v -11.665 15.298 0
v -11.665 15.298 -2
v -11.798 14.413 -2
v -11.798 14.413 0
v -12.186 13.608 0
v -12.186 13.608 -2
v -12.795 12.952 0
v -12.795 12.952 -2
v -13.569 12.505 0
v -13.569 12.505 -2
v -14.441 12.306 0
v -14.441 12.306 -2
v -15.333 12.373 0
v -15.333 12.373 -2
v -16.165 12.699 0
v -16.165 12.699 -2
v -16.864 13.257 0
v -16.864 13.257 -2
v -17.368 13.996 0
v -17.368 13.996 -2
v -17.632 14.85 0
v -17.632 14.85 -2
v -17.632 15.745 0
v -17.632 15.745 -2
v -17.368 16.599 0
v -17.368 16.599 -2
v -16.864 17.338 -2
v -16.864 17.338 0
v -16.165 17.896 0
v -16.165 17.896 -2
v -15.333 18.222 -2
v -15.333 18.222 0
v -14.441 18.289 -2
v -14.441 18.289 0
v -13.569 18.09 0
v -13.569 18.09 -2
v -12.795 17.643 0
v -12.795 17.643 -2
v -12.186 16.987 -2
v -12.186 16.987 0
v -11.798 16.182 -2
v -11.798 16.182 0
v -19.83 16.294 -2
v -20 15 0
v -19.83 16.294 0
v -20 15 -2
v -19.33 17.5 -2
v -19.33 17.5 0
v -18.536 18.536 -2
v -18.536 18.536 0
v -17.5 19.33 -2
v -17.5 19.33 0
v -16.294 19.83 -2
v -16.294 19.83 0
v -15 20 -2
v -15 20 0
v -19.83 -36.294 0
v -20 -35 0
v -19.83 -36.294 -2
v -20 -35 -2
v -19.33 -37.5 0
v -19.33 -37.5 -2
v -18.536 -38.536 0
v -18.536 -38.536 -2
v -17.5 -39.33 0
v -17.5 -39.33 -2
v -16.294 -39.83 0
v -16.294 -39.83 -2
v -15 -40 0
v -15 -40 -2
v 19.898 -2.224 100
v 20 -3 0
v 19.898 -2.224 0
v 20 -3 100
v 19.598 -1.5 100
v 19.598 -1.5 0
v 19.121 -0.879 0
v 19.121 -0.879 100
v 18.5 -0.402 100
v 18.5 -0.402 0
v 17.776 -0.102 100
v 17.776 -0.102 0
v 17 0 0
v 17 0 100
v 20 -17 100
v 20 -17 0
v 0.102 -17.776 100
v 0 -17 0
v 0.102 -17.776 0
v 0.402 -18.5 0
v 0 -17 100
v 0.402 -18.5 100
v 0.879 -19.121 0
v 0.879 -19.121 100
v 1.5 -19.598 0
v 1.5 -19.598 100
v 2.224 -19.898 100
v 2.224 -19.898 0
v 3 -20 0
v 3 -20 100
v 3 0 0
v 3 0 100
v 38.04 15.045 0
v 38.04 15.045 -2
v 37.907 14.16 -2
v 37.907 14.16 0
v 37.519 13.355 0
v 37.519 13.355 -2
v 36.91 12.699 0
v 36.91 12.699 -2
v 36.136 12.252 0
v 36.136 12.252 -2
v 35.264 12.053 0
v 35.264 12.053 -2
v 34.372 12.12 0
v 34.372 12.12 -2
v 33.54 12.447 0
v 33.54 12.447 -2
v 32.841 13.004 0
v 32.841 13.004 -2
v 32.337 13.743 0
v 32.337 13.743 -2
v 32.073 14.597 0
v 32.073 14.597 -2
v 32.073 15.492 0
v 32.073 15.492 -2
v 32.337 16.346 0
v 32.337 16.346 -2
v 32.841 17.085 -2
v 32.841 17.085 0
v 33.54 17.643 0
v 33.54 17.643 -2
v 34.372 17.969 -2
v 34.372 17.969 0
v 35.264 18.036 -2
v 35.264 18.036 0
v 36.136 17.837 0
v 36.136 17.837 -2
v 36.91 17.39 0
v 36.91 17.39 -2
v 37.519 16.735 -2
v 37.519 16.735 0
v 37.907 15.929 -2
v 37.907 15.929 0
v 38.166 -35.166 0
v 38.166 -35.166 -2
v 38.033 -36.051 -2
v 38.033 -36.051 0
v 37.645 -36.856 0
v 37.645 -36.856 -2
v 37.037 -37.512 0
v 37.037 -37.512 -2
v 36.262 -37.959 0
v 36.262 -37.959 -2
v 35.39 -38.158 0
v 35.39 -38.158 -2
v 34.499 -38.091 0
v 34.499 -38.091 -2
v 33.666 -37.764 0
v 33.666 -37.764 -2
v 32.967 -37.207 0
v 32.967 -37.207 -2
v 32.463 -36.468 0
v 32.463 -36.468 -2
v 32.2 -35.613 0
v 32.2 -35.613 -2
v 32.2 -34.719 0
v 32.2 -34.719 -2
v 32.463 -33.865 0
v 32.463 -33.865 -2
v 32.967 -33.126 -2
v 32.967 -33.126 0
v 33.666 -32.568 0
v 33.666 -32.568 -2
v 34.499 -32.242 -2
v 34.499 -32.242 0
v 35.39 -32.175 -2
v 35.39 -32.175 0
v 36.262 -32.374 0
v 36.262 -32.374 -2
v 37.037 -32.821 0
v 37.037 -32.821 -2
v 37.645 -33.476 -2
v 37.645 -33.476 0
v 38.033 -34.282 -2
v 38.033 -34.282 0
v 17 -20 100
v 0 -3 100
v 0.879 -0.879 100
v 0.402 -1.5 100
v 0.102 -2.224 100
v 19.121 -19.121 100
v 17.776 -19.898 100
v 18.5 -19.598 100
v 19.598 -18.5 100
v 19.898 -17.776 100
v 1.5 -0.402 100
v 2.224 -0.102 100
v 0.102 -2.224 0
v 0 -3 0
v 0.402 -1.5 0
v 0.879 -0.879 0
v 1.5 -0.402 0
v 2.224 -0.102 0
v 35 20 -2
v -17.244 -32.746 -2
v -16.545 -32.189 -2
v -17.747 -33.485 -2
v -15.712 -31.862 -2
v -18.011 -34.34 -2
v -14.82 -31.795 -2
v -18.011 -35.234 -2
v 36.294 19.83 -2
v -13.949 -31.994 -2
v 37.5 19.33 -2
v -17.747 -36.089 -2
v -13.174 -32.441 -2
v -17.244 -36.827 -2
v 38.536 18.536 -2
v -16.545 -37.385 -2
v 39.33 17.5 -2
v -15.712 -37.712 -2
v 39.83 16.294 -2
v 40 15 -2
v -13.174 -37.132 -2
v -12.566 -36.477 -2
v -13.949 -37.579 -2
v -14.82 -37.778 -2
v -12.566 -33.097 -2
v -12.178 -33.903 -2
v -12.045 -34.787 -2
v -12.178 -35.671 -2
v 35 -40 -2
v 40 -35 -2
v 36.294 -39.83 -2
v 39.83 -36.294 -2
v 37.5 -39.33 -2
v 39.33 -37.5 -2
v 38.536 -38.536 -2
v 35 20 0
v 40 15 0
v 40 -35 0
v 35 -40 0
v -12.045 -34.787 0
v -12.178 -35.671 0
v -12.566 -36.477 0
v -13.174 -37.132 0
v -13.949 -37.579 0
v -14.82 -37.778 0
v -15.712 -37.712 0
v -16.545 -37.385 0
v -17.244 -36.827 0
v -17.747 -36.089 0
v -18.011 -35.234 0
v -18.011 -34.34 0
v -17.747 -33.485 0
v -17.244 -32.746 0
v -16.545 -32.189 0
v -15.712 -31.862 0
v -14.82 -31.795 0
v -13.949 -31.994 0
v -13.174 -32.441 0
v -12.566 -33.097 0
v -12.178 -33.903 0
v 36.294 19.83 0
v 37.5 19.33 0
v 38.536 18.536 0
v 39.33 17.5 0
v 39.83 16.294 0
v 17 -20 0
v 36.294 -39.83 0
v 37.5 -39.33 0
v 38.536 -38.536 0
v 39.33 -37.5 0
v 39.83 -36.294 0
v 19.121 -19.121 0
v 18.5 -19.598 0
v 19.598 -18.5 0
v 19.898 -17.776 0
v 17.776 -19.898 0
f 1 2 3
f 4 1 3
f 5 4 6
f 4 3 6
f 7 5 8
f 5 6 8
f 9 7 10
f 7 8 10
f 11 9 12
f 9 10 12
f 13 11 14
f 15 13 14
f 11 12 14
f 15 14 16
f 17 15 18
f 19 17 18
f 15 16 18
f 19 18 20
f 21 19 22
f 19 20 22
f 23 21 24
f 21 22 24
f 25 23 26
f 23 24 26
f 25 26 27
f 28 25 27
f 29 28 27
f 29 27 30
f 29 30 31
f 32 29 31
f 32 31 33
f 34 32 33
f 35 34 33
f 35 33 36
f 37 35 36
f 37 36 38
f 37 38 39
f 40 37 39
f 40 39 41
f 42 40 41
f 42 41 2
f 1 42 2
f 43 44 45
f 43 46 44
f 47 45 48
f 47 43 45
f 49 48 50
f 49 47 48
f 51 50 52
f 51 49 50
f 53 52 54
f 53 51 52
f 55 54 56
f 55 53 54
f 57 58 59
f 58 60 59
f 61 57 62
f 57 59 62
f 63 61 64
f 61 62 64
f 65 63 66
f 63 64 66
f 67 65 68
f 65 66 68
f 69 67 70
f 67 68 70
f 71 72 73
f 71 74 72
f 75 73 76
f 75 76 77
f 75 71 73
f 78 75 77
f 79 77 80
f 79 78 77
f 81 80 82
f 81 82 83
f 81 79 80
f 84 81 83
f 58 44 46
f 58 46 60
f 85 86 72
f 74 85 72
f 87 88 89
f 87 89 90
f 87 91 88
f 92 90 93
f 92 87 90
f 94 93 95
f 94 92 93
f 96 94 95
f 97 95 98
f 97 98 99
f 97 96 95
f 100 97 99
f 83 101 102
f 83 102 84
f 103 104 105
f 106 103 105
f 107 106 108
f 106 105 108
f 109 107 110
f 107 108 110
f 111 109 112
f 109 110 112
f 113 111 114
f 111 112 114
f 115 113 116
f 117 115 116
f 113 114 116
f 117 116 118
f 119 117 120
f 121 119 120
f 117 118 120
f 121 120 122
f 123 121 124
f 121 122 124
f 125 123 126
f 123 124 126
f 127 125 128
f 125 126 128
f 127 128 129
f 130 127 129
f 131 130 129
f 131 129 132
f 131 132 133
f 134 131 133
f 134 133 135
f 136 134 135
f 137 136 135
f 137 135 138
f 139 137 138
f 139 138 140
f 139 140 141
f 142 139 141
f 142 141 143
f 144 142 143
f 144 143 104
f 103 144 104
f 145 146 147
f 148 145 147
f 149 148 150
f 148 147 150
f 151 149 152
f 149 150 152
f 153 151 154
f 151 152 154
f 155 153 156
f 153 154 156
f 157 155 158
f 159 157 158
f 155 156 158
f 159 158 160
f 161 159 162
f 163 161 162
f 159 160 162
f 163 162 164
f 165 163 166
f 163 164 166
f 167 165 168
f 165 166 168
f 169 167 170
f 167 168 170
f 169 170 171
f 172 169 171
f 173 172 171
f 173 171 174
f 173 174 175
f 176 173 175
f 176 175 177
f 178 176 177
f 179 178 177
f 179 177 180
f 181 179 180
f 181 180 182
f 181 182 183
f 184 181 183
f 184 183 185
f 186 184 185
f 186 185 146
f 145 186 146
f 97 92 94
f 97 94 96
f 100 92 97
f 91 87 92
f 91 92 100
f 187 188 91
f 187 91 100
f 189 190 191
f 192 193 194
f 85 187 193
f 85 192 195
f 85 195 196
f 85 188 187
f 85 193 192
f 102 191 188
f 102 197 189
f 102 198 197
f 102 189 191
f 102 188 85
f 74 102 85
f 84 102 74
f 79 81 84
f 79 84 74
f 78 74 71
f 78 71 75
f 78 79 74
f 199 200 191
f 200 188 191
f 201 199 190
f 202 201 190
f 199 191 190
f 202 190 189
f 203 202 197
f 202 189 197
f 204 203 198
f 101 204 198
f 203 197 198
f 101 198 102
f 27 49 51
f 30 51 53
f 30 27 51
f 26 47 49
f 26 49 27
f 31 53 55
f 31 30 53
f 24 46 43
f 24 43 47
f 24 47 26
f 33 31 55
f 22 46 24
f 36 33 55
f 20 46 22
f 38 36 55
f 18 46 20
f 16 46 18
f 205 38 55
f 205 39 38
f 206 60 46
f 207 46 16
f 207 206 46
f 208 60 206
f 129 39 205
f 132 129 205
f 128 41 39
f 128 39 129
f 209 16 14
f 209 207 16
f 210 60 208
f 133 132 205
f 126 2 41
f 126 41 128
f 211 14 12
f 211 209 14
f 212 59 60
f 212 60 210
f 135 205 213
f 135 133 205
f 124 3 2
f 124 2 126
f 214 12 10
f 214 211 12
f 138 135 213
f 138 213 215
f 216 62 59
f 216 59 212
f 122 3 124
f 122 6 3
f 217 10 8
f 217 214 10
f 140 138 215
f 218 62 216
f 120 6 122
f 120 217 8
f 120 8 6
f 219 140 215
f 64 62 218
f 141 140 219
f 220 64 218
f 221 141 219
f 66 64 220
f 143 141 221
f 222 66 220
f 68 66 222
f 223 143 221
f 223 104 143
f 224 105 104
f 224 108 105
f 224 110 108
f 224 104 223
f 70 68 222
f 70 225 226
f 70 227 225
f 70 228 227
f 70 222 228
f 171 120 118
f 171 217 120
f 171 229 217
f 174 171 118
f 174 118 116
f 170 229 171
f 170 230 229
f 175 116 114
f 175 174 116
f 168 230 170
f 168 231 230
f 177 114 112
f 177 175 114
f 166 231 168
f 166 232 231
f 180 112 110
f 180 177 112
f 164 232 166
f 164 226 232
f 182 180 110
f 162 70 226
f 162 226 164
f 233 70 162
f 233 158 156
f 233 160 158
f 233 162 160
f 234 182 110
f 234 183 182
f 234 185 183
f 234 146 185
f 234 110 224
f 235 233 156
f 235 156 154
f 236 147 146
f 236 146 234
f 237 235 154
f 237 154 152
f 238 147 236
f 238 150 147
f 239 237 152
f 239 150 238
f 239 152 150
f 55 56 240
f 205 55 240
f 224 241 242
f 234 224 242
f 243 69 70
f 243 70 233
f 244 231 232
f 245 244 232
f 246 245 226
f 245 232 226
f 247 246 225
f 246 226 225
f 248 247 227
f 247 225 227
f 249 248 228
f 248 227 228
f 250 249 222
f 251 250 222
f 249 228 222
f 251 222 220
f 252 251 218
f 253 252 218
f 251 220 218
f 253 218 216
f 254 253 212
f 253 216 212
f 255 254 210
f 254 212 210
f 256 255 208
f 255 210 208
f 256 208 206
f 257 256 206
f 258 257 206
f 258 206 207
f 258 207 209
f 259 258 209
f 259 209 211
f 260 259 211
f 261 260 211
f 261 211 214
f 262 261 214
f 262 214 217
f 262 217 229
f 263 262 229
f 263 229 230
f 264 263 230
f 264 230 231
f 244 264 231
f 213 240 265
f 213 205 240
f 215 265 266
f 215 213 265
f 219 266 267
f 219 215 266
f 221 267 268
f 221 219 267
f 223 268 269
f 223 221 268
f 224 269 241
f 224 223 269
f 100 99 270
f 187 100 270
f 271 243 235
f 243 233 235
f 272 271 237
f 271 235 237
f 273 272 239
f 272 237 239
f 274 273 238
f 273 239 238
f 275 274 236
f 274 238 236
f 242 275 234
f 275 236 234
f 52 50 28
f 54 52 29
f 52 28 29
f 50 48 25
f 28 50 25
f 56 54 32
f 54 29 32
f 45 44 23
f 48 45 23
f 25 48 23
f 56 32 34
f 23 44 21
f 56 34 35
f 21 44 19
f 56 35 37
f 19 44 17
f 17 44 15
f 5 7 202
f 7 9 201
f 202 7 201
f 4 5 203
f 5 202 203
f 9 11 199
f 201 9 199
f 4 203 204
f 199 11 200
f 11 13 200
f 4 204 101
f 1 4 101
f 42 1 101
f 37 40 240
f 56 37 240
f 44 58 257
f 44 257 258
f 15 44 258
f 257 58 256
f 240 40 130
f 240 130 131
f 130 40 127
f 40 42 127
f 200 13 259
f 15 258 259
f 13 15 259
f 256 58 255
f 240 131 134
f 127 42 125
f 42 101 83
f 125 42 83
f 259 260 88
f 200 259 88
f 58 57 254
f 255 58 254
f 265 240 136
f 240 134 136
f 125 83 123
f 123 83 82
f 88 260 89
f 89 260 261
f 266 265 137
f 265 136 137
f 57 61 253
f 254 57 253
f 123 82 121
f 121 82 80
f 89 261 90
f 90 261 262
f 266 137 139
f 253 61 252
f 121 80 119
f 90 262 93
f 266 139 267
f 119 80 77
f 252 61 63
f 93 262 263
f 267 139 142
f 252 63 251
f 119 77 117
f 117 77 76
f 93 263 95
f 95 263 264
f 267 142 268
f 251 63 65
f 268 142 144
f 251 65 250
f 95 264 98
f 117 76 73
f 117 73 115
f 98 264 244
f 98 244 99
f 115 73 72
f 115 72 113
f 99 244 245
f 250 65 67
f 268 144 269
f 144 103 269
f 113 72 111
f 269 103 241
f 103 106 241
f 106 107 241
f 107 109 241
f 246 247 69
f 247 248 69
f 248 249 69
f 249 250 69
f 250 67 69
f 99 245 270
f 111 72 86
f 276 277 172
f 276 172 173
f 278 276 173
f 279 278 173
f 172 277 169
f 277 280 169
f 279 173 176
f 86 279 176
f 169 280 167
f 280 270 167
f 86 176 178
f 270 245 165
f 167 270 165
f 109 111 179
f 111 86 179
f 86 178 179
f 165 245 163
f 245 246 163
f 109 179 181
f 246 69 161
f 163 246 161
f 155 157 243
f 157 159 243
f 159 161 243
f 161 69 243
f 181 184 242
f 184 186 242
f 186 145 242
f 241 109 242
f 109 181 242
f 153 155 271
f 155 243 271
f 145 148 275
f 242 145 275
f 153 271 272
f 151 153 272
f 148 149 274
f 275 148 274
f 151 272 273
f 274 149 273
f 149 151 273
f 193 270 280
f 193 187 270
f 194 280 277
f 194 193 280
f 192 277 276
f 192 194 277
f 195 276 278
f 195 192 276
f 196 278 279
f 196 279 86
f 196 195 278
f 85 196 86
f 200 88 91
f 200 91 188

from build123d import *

# Parameters (mm, degrees)
SKETCH_W     = 20
SKETCH_H     = 20
PAD_DEPTH    = 100
FILLET_R     = 3
FILLET001_R  = 3
SKETCH001_W  = 60
SKETCH001_H  = 60
PAD001_DEPTH = 2
FILLET002_R  = 5
FILLET003_R  = 5
FILLET004_R  = 5
FILLET005_R  = 5
SKETCH002_R  = 3
HOLE_DEPTH   = 25
HOLE_TIPS_R  = 3


with BuildPart() as part:
    # Sketch → Pad (new body)
    with BuildSketch(Plane.XY):
        with Locations((10, -10)):
            Rectangle(SKETCH_W, SKETCH_H)
    extrude(amount=PAD_DEPTH)

    # Fillet
    fillet_edges = [part.edges().sort_by_distance(p)[0] for p in [
        (0, -20, 50),
        (20, 0, 50),
        (0, 0, 50),
    ]]
    fillet(fillet_edges, radius=FILLET_R)

    # Fillet001
    fillet001_edges = [part.edges().sort_by_distance(p)[0] for p in [
        (20, -20, 50),
    ]]
    fillet(fillet001_edges, radius=FILLET001_R)

    # Sketch001 (on Face1 of Fillet001) → Pad001 (join)
    with BuildSketch(Plane(origin=(0, 0, 0), x_dir=(1, 0, 0), z_dir=(0, 0, -1))):
        with Locations((10, 10)):
            Rectangle(SKETCH001_W, SKETCH001_H)
    extrude(amount=PAD001_DEPTH)

    # Fillet002
    fillet002_edges = [part.edges().sort_by_distance(p)[0] for p in [
        (-20, 20, -1),
    ]]
    fillet(fillet002_edges, radius=FILLET002_R)

    # Fillet003
    fillet003_edges = [part.edges().sort_by_distance(p)[0] for p in [
        (40, 20, -1),
    ]]
    fillet(fillet003_edges, radius=FILLET003_R)

    # Fillet004
    fillet004_edges = [part.edges().sort_by_distance(p)[0] for p in [
        (-20, -40, -1),
    ]]
    fillet(fillet004_edges, radius=FILLET004_R)

    # Fillet005
    fillet005_edges = [part.edges().sort_by_distance(p)[0] for p in [
        (40, -40, -1),
    ]]
    fillet(fillet005_edges, radius=FILLET005_R)

    # Sketch002 (on Face18 of Fillet005) → Hole (cut)
    with BuildSketch(Plane(origin=(0, 0, -2), x_dir=(1, 0, 0), z_dir=(0, 0, -1))):
        with Locations((-14.665156, -15.297529)):
            Circle(SKETCH002_R)
        with Locations((35.039818, -15.044578)):
            Circle(SKETCH002_R)
        with Locations((35.166283, 35.166294)):
            Circle(SKETCH002_R)
        with Locations((-15.044579, 34.786861)):
            Circle(SKETCH002_R)
    extrude(amount=-HOLE_DEPTH, mode=Mode.SUBTRACT)

    # Hole tips → Hole tip 1 section 0
    with BuildSketch(Plane(origin=(0, 0, 23), x_dir=(1, 0, 0), z_dir=(0, 0, -1)), mode=Mode.PRIVATE) as hole_tip_1_s0:
        with Locations((-14.665156, -15.297529)):
            Circle(HOLE_TIPS_R)
    loft([hole_tip_1_s0.sketch, Vertex(-14.665156, 15.297529, 24.802582)], mode=Mode.SUBTRACT)

    # Hole tips → Hole tip 2 section 0
    with BuildSketch(Plane(origin=(0, 0, 23), x_dir=(1, 0, 0), z_dir=(0, 0, -1)), mode=Mode.PRIVATE) as hole_tip_2_s0:
        with Locations((35.039818, -15.044578)):
            Circle(HOLE_TIPS_R)
    loft([hole_tip_2_s0.sketch, Vertex(35.039818, 15.044578, 24.802582)], mode=Mode.SUBTRACT)

    # Hole tips → Hole tip 3 section 0
    with BuildSketch(Plane(origin=(0, 0, 23), x_dir=(1, 0, 0), z_dir=(0, 0, -1)), mode=Mode.PRIVATE) as hole_tip_3_s0:
        with Locations((35.166283, 35.166294)):
            Circle(HOLE_TIPS_R)
    loft([hole_tip_3_s0.sketch, Vertex(35.166283, -35.166294, 24.802582)], mode=Mode.SUBTRACT)

    # Hole tips → Hole tip 4 section 0
    with BuildSketch(Plane(origin=(0, 0, 23), x_dir=(1, 0, 0), z_dir=(0, 0, -1)), mode=Mode.PRIVATE) as hole_tip_4_s0:
        with Locations((-15.044579, 34.786861)):
            Circle(HOLE_TIPS_R)
    loft([hole_tip_4_s0.sketch, Vertex(-15.044579, -34.786861, 24.802582)], mode=Mode.SUBTRACT)


solid = part.part
